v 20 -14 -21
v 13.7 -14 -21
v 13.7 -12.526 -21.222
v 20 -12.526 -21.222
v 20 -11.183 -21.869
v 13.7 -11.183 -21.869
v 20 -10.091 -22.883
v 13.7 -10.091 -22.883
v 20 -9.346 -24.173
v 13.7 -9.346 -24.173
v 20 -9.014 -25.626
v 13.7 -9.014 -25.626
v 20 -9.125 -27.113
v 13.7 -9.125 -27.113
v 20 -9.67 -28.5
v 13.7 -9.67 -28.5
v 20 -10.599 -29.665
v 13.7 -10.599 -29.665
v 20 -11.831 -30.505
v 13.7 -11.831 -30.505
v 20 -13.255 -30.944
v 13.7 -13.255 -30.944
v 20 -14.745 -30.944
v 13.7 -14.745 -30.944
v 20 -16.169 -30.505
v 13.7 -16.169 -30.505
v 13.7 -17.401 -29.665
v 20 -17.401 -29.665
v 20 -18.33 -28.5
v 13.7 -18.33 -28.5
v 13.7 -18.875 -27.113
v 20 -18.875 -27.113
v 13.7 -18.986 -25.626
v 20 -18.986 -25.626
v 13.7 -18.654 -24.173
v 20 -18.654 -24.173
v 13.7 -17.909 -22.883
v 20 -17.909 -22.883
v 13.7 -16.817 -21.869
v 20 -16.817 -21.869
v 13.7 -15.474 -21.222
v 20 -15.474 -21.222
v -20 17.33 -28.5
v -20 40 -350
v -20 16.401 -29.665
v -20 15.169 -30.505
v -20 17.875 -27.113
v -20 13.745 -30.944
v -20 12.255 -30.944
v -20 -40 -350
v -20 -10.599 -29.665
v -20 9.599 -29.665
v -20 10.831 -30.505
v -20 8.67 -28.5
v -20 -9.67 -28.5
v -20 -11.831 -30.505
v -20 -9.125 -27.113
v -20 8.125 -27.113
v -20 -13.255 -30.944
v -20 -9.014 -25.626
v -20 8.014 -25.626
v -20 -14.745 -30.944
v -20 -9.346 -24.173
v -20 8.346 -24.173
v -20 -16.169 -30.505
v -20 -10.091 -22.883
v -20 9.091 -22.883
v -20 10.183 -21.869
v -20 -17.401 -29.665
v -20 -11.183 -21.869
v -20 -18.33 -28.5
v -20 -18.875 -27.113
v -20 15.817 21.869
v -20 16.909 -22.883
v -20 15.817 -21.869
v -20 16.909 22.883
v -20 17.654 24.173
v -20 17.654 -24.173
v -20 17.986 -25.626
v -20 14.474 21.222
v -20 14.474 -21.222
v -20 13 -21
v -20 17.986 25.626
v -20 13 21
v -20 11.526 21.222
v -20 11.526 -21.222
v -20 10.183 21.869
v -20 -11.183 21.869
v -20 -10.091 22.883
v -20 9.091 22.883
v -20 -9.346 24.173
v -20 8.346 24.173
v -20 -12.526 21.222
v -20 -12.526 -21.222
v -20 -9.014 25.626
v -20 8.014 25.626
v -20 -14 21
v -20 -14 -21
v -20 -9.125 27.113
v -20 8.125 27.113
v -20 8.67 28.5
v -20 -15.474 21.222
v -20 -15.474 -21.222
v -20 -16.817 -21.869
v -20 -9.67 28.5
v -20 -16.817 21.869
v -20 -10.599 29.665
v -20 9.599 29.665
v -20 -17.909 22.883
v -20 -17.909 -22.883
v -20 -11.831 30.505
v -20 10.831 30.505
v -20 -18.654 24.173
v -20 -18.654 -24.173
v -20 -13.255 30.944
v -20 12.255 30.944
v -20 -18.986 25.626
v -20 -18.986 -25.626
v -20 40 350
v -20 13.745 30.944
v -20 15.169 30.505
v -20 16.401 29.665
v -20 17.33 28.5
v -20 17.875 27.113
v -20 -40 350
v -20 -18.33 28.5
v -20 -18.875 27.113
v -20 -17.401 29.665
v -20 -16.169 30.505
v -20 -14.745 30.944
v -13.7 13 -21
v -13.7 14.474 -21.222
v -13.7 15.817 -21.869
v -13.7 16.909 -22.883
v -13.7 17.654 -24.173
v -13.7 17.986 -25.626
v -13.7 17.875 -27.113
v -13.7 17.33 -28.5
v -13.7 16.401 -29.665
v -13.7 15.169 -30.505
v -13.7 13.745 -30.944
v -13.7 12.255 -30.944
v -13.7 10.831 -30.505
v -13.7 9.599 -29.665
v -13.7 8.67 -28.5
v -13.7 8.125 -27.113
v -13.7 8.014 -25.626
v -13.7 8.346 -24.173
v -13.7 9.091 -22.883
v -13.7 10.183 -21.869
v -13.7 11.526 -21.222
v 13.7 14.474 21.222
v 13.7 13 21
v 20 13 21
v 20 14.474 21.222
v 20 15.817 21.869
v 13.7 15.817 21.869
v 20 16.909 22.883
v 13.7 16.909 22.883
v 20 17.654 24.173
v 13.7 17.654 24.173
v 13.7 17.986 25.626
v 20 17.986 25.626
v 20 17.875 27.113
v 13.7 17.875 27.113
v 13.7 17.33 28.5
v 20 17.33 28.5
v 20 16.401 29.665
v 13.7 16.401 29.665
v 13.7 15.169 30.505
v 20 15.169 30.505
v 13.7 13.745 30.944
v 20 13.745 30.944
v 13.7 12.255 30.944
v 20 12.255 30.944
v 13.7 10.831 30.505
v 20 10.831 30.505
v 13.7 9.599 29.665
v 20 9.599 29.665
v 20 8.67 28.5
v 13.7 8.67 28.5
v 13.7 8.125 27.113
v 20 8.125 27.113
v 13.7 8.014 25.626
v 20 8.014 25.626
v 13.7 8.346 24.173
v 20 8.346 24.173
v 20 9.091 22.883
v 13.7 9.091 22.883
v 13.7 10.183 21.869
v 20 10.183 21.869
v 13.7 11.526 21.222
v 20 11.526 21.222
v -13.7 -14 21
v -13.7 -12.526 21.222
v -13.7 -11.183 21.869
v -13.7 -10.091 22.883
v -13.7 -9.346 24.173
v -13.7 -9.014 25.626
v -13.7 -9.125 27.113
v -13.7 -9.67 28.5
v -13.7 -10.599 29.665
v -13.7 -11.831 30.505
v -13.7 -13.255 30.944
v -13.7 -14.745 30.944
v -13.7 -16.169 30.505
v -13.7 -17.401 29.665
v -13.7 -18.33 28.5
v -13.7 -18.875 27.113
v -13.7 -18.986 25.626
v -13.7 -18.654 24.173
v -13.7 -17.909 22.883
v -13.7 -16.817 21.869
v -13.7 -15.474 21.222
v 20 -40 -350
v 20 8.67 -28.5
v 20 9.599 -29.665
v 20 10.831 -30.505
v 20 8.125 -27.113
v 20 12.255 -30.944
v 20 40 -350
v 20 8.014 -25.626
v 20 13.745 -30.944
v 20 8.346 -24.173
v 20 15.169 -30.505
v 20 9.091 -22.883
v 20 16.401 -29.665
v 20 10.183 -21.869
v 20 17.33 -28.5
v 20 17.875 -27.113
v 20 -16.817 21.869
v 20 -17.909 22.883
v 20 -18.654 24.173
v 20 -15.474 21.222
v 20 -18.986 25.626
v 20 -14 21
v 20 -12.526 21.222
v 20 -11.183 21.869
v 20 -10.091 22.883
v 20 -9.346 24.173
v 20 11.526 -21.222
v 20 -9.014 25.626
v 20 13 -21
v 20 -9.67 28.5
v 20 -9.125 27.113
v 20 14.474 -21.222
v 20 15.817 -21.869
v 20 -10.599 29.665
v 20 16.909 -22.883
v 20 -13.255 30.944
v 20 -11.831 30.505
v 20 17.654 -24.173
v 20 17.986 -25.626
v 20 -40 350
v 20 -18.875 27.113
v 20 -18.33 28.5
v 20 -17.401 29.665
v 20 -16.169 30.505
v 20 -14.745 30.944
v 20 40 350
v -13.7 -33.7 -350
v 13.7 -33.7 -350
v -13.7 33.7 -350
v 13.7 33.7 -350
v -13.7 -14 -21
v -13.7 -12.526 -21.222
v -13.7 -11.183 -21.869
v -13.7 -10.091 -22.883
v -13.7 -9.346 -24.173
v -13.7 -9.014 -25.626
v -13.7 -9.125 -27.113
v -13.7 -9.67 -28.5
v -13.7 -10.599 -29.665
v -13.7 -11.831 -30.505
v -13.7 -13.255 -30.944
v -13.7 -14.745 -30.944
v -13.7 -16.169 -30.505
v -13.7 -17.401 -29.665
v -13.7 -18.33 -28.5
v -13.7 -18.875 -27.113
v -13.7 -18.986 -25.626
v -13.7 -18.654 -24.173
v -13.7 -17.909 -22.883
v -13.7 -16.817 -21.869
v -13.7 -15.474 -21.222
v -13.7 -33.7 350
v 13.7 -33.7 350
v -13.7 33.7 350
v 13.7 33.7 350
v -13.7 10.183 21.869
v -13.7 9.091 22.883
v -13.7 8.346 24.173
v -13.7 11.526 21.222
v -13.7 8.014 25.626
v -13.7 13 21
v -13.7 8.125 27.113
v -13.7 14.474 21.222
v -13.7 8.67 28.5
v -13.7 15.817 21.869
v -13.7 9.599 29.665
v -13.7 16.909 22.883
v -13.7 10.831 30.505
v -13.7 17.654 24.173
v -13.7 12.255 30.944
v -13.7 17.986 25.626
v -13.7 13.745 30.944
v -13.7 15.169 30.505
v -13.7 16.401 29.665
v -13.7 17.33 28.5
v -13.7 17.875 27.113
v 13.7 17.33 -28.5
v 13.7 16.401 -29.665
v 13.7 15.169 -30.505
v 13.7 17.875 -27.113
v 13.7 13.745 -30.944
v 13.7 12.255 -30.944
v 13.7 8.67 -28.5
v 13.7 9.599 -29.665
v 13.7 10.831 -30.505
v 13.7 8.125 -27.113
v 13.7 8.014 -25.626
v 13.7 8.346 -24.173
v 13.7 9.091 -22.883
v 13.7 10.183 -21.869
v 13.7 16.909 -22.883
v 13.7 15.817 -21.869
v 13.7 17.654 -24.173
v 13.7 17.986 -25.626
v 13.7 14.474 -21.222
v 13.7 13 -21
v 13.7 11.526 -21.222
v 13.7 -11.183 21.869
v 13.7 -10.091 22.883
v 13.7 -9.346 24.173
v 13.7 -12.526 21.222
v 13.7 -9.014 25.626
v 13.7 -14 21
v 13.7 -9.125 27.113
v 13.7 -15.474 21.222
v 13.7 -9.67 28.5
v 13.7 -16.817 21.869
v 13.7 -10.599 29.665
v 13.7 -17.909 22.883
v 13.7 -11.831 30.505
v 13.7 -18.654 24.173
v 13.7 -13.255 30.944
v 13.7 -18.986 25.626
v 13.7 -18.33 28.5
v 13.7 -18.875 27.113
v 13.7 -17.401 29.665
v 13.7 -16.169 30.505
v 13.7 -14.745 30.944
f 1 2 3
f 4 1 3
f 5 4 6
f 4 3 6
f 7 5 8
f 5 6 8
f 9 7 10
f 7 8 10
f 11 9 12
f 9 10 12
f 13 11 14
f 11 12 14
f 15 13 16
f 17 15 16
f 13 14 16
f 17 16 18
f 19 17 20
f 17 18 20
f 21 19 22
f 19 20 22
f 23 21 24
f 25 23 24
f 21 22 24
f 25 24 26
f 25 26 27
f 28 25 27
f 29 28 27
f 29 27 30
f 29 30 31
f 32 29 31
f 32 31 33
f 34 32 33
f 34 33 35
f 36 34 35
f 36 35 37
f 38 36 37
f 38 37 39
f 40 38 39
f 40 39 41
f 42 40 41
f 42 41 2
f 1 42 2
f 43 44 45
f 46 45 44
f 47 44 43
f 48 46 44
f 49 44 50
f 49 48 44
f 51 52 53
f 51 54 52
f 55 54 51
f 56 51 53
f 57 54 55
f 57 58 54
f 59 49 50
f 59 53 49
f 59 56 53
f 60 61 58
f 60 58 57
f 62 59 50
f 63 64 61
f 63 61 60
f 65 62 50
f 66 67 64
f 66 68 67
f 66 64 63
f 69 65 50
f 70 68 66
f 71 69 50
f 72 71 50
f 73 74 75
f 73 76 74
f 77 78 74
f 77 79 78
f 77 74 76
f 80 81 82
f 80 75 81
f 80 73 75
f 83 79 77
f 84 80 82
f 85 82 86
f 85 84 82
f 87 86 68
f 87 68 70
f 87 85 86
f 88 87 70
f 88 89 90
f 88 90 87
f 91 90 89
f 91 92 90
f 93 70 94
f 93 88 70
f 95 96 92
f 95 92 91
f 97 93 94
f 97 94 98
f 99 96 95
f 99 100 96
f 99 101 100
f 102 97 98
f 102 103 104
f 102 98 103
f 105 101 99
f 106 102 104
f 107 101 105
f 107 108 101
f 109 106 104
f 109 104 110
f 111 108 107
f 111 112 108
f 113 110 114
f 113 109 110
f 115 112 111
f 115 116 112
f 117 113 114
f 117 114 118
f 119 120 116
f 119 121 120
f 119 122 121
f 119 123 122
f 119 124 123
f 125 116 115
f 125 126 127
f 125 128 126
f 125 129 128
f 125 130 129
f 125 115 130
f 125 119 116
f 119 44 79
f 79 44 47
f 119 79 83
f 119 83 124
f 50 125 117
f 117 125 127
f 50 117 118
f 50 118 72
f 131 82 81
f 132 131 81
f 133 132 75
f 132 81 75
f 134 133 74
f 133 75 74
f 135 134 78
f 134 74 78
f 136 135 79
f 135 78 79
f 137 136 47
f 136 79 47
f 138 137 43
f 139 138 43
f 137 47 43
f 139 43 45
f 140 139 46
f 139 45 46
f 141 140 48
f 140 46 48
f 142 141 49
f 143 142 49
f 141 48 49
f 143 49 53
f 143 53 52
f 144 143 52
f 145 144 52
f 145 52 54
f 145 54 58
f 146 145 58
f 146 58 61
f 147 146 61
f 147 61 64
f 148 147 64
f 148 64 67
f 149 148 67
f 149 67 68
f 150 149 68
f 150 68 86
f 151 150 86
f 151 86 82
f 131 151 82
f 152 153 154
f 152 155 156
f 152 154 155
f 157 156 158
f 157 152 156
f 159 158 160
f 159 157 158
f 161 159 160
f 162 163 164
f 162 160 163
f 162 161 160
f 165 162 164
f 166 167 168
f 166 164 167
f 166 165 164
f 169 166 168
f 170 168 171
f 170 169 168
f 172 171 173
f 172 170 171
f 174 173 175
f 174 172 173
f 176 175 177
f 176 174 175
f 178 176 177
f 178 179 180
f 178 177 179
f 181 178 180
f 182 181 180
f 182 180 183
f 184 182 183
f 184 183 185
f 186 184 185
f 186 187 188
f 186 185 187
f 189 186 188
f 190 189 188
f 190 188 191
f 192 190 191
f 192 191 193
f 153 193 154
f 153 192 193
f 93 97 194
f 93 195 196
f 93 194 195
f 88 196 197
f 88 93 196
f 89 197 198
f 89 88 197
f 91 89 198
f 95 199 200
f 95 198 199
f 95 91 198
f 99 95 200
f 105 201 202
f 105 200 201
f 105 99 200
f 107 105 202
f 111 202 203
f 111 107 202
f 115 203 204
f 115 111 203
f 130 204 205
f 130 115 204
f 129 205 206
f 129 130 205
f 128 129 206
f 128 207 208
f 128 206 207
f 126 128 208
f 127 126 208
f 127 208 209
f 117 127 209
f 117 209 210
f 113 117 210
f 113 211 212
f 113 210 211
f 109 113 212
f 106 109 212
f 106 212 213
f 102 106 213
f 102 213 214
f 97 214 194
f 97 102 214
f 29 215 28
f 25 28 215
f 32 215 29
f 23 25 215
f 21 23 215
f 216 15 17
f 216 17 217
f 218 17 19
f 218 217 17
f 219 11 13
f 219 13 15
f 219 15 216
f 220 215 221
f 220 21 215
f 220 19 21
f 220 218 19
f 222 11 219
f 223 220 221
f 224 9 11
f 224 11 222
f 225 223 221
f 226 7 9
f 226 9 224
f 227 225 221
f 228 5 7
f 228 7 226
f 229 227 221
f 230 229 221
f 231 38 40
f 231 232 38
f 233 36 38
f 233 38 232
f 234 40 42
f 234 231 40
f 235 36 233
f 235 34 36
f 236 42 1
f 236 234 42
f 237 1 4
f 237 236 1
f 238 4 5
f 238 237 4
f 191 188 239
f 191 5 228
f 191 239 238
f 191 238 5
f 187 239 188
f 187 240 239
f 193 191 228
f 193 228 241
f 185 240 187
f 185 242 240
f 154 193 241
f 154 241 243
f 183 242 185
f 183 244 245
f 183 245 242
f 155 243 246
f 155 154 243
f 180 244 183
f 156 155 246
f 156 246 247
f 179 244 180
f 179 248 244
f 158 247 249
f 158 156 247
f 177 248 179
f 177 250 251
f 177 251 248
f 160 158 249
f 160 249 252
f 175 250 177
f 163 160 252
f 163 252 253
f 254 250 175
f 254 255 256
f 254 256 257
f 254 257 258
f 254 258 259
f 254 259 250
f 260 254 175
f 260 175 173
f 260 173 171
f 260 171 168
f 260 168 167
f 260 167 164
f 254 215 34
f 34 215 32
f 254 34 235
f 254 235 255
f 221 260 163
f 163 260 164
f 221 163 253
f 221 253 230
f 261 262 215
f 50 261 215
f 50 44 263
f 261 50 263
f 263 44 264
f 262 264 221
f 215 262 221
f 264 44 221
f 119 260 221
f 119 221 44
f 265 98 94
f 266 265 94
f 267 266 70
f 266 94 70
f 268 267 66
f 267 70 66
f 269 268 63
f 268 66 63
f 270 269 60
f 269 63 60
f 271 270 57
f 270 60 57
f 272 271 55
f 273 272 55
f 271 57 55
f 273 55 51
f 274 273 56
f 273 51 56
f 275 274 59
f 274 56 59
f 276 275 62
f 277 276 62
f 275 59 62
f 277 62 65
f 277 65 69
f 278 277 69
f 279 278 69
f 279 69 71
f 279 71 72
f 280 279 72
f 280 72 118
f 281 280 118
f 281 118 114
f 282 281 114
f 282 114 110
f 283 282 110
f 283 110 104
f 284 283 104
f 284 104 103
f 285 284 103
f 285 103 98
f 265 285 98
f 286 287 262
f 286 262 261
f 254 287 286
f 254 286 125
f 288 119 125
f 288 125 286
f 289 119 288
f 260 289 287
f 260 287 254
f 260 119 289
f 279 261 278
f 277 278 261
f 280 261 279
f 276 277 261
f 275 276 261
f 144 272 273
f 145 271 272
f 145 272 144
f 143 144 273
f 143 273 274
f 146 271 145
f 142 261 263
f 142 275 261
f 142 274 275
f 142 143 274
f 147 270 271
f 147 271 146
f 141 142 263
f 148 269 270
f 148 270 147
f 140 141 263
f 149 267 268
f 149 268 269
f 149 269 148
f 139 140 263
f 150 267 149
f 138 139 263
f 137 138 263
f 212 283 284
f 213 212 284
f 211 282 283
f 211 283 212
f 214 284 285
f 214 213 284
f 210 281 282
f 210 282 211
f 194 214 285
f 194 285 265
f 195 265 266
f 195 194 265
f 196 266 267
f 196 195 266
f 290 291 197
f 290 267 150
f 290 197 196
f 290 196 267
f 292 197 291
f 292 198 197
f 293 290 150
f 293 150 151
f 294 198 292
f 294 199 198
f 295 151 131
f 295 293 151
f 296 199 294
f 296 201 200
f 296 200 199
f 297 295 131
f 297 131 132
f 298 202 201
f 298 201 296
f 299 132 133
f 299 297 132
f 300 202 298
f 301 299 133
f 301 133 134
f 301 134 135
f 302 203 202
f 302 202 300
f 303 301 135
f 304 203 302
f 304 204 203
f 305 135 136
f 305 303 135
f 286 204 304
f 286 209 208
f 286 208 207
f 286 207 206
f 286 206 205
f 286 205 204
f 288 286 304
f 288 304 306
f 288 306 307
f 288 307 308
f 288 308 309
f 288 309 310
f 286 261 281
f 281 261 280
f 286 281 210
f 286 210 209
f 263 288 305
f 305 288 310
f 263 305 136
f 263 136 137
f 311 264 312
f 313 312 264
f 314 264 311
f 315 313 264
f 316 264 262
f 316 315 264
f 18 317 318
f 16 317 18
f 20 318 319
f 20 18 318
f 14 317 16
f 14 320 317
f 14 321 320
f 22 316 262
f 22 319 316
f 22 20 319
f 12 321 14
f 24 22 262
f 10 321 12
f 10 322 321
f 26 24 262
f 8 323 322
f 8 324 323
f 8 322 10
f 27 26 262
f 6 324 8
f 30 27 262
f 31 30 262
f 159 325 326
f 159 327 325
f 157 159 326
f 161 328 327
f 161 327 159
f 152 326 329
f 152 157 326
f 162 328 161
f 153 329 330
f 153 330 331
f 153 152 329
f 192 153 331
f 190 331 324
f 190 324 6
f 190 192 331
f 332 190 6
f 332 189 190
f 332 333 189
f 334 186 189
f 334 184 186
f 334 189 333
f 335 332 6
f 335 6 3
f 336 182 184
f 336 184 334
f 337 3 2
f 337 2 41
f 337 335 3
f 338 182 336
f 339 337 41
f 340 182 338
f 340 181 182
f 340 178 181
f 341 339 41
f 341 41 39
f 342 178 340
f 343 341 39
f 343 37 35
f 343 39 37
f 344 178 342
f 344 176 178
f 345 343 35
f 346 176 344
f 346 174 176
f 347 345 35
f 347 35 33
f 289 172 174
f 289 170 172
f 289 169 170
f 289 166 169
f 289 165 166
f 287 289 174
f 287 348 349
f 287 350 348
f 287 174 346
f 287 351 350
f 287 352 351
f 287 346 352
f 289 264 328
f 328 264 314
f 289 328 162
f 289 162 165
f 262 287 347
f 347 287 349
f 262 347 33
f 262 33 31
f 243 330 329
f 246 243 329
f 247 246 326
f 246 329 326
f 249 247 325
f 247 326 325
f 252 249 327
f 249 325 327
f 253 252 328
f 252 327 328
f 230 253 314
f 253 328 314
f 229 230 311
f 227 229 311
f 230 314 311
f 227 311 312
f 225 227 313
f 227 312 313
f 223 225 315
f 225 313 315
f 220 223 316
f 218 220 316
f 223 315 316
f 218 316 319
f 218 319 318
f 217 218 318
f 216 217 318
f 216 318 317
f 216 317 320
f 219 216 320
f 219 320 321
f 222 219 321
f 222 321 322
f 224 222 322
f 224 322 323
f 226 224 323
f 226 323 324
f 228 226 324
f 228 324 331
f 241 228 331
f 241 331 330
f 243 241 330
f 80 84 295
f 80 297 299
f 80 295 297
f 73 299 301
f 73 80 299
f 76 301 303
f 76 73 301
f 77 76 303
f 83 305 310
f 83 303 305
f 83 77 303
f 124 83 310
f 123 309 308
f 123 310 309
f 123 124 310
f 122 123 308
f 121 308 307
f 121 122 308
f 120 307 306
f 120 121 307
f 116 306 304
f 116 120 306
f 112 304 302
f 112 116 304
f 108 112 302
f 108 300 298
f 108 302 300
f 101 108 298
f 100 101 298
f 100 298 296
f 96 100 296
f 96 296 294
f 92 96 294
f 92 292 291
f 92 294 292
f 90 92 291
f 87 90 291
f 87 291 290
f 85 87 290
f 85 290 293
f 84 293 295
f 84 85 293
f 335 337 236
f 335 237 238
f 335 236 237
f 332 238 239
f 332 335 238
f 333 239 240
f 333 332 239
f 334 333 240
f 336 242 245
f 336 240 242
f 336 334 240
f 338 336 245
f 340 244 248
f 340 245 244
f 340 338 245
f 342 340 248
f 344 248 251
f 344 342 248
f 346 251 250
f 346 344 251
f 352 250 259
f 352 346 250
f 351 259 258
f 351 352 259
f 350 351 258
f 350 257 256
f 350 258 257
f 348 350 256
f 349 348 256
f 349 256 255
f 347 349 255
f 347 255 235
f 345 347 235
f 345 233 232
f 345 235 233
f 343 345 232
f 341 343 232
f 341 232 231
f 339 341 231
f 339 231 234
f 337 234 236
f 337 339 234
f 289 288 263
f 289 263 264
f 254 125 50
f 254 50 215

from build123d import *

# Parameters (mm, degrees)
SKETCH1_W            = 40
SKETCH1_H            = 80
SKETCH1_W_2          = 27.4
SKETCH1_H_2          = 67.4
M8_CLEARANCE_HOLE1_D = 10


with BuildPart() as part:
    # Sweep1: sweep along a curve in space
    with BuildLine() as sweep1_path:
        add(Edge.make_bspline(
            [(0, 0, -350), (0, 0, 350)],
            knots=[0, 0, 1, 1], degree=1))
    # Sketch1 → Sweep1 (sweep)
    with BuildSketch(Plane.XY):
        Rectangle(SKETCH1_W, SKETCH1_H)
        Rectangle(SKETCH1_W_2, SKETCH1_H_2, mode=Mode.SUBTRACT)
    sweep(path=sweep1_path.line)

    # M8 Clearance Hole1 (through all)
    with Locations(Plane(origin=(20, 0, 0), x_dir=(0, 0, -1), z_dir=(1, 0, 0))):
        with Locations((26, 13), (26, -14)):
            m8_clearance_hole1 = Hole(M8_CLEARANCE_HOLE1_D / 2)

    # Mirror1: M8 Clearance Hole1 across plane
    add(m8_clearance_hole1.mirror(Plane.XY), mode=Mode.SUBTRACT)


solid = part.part
